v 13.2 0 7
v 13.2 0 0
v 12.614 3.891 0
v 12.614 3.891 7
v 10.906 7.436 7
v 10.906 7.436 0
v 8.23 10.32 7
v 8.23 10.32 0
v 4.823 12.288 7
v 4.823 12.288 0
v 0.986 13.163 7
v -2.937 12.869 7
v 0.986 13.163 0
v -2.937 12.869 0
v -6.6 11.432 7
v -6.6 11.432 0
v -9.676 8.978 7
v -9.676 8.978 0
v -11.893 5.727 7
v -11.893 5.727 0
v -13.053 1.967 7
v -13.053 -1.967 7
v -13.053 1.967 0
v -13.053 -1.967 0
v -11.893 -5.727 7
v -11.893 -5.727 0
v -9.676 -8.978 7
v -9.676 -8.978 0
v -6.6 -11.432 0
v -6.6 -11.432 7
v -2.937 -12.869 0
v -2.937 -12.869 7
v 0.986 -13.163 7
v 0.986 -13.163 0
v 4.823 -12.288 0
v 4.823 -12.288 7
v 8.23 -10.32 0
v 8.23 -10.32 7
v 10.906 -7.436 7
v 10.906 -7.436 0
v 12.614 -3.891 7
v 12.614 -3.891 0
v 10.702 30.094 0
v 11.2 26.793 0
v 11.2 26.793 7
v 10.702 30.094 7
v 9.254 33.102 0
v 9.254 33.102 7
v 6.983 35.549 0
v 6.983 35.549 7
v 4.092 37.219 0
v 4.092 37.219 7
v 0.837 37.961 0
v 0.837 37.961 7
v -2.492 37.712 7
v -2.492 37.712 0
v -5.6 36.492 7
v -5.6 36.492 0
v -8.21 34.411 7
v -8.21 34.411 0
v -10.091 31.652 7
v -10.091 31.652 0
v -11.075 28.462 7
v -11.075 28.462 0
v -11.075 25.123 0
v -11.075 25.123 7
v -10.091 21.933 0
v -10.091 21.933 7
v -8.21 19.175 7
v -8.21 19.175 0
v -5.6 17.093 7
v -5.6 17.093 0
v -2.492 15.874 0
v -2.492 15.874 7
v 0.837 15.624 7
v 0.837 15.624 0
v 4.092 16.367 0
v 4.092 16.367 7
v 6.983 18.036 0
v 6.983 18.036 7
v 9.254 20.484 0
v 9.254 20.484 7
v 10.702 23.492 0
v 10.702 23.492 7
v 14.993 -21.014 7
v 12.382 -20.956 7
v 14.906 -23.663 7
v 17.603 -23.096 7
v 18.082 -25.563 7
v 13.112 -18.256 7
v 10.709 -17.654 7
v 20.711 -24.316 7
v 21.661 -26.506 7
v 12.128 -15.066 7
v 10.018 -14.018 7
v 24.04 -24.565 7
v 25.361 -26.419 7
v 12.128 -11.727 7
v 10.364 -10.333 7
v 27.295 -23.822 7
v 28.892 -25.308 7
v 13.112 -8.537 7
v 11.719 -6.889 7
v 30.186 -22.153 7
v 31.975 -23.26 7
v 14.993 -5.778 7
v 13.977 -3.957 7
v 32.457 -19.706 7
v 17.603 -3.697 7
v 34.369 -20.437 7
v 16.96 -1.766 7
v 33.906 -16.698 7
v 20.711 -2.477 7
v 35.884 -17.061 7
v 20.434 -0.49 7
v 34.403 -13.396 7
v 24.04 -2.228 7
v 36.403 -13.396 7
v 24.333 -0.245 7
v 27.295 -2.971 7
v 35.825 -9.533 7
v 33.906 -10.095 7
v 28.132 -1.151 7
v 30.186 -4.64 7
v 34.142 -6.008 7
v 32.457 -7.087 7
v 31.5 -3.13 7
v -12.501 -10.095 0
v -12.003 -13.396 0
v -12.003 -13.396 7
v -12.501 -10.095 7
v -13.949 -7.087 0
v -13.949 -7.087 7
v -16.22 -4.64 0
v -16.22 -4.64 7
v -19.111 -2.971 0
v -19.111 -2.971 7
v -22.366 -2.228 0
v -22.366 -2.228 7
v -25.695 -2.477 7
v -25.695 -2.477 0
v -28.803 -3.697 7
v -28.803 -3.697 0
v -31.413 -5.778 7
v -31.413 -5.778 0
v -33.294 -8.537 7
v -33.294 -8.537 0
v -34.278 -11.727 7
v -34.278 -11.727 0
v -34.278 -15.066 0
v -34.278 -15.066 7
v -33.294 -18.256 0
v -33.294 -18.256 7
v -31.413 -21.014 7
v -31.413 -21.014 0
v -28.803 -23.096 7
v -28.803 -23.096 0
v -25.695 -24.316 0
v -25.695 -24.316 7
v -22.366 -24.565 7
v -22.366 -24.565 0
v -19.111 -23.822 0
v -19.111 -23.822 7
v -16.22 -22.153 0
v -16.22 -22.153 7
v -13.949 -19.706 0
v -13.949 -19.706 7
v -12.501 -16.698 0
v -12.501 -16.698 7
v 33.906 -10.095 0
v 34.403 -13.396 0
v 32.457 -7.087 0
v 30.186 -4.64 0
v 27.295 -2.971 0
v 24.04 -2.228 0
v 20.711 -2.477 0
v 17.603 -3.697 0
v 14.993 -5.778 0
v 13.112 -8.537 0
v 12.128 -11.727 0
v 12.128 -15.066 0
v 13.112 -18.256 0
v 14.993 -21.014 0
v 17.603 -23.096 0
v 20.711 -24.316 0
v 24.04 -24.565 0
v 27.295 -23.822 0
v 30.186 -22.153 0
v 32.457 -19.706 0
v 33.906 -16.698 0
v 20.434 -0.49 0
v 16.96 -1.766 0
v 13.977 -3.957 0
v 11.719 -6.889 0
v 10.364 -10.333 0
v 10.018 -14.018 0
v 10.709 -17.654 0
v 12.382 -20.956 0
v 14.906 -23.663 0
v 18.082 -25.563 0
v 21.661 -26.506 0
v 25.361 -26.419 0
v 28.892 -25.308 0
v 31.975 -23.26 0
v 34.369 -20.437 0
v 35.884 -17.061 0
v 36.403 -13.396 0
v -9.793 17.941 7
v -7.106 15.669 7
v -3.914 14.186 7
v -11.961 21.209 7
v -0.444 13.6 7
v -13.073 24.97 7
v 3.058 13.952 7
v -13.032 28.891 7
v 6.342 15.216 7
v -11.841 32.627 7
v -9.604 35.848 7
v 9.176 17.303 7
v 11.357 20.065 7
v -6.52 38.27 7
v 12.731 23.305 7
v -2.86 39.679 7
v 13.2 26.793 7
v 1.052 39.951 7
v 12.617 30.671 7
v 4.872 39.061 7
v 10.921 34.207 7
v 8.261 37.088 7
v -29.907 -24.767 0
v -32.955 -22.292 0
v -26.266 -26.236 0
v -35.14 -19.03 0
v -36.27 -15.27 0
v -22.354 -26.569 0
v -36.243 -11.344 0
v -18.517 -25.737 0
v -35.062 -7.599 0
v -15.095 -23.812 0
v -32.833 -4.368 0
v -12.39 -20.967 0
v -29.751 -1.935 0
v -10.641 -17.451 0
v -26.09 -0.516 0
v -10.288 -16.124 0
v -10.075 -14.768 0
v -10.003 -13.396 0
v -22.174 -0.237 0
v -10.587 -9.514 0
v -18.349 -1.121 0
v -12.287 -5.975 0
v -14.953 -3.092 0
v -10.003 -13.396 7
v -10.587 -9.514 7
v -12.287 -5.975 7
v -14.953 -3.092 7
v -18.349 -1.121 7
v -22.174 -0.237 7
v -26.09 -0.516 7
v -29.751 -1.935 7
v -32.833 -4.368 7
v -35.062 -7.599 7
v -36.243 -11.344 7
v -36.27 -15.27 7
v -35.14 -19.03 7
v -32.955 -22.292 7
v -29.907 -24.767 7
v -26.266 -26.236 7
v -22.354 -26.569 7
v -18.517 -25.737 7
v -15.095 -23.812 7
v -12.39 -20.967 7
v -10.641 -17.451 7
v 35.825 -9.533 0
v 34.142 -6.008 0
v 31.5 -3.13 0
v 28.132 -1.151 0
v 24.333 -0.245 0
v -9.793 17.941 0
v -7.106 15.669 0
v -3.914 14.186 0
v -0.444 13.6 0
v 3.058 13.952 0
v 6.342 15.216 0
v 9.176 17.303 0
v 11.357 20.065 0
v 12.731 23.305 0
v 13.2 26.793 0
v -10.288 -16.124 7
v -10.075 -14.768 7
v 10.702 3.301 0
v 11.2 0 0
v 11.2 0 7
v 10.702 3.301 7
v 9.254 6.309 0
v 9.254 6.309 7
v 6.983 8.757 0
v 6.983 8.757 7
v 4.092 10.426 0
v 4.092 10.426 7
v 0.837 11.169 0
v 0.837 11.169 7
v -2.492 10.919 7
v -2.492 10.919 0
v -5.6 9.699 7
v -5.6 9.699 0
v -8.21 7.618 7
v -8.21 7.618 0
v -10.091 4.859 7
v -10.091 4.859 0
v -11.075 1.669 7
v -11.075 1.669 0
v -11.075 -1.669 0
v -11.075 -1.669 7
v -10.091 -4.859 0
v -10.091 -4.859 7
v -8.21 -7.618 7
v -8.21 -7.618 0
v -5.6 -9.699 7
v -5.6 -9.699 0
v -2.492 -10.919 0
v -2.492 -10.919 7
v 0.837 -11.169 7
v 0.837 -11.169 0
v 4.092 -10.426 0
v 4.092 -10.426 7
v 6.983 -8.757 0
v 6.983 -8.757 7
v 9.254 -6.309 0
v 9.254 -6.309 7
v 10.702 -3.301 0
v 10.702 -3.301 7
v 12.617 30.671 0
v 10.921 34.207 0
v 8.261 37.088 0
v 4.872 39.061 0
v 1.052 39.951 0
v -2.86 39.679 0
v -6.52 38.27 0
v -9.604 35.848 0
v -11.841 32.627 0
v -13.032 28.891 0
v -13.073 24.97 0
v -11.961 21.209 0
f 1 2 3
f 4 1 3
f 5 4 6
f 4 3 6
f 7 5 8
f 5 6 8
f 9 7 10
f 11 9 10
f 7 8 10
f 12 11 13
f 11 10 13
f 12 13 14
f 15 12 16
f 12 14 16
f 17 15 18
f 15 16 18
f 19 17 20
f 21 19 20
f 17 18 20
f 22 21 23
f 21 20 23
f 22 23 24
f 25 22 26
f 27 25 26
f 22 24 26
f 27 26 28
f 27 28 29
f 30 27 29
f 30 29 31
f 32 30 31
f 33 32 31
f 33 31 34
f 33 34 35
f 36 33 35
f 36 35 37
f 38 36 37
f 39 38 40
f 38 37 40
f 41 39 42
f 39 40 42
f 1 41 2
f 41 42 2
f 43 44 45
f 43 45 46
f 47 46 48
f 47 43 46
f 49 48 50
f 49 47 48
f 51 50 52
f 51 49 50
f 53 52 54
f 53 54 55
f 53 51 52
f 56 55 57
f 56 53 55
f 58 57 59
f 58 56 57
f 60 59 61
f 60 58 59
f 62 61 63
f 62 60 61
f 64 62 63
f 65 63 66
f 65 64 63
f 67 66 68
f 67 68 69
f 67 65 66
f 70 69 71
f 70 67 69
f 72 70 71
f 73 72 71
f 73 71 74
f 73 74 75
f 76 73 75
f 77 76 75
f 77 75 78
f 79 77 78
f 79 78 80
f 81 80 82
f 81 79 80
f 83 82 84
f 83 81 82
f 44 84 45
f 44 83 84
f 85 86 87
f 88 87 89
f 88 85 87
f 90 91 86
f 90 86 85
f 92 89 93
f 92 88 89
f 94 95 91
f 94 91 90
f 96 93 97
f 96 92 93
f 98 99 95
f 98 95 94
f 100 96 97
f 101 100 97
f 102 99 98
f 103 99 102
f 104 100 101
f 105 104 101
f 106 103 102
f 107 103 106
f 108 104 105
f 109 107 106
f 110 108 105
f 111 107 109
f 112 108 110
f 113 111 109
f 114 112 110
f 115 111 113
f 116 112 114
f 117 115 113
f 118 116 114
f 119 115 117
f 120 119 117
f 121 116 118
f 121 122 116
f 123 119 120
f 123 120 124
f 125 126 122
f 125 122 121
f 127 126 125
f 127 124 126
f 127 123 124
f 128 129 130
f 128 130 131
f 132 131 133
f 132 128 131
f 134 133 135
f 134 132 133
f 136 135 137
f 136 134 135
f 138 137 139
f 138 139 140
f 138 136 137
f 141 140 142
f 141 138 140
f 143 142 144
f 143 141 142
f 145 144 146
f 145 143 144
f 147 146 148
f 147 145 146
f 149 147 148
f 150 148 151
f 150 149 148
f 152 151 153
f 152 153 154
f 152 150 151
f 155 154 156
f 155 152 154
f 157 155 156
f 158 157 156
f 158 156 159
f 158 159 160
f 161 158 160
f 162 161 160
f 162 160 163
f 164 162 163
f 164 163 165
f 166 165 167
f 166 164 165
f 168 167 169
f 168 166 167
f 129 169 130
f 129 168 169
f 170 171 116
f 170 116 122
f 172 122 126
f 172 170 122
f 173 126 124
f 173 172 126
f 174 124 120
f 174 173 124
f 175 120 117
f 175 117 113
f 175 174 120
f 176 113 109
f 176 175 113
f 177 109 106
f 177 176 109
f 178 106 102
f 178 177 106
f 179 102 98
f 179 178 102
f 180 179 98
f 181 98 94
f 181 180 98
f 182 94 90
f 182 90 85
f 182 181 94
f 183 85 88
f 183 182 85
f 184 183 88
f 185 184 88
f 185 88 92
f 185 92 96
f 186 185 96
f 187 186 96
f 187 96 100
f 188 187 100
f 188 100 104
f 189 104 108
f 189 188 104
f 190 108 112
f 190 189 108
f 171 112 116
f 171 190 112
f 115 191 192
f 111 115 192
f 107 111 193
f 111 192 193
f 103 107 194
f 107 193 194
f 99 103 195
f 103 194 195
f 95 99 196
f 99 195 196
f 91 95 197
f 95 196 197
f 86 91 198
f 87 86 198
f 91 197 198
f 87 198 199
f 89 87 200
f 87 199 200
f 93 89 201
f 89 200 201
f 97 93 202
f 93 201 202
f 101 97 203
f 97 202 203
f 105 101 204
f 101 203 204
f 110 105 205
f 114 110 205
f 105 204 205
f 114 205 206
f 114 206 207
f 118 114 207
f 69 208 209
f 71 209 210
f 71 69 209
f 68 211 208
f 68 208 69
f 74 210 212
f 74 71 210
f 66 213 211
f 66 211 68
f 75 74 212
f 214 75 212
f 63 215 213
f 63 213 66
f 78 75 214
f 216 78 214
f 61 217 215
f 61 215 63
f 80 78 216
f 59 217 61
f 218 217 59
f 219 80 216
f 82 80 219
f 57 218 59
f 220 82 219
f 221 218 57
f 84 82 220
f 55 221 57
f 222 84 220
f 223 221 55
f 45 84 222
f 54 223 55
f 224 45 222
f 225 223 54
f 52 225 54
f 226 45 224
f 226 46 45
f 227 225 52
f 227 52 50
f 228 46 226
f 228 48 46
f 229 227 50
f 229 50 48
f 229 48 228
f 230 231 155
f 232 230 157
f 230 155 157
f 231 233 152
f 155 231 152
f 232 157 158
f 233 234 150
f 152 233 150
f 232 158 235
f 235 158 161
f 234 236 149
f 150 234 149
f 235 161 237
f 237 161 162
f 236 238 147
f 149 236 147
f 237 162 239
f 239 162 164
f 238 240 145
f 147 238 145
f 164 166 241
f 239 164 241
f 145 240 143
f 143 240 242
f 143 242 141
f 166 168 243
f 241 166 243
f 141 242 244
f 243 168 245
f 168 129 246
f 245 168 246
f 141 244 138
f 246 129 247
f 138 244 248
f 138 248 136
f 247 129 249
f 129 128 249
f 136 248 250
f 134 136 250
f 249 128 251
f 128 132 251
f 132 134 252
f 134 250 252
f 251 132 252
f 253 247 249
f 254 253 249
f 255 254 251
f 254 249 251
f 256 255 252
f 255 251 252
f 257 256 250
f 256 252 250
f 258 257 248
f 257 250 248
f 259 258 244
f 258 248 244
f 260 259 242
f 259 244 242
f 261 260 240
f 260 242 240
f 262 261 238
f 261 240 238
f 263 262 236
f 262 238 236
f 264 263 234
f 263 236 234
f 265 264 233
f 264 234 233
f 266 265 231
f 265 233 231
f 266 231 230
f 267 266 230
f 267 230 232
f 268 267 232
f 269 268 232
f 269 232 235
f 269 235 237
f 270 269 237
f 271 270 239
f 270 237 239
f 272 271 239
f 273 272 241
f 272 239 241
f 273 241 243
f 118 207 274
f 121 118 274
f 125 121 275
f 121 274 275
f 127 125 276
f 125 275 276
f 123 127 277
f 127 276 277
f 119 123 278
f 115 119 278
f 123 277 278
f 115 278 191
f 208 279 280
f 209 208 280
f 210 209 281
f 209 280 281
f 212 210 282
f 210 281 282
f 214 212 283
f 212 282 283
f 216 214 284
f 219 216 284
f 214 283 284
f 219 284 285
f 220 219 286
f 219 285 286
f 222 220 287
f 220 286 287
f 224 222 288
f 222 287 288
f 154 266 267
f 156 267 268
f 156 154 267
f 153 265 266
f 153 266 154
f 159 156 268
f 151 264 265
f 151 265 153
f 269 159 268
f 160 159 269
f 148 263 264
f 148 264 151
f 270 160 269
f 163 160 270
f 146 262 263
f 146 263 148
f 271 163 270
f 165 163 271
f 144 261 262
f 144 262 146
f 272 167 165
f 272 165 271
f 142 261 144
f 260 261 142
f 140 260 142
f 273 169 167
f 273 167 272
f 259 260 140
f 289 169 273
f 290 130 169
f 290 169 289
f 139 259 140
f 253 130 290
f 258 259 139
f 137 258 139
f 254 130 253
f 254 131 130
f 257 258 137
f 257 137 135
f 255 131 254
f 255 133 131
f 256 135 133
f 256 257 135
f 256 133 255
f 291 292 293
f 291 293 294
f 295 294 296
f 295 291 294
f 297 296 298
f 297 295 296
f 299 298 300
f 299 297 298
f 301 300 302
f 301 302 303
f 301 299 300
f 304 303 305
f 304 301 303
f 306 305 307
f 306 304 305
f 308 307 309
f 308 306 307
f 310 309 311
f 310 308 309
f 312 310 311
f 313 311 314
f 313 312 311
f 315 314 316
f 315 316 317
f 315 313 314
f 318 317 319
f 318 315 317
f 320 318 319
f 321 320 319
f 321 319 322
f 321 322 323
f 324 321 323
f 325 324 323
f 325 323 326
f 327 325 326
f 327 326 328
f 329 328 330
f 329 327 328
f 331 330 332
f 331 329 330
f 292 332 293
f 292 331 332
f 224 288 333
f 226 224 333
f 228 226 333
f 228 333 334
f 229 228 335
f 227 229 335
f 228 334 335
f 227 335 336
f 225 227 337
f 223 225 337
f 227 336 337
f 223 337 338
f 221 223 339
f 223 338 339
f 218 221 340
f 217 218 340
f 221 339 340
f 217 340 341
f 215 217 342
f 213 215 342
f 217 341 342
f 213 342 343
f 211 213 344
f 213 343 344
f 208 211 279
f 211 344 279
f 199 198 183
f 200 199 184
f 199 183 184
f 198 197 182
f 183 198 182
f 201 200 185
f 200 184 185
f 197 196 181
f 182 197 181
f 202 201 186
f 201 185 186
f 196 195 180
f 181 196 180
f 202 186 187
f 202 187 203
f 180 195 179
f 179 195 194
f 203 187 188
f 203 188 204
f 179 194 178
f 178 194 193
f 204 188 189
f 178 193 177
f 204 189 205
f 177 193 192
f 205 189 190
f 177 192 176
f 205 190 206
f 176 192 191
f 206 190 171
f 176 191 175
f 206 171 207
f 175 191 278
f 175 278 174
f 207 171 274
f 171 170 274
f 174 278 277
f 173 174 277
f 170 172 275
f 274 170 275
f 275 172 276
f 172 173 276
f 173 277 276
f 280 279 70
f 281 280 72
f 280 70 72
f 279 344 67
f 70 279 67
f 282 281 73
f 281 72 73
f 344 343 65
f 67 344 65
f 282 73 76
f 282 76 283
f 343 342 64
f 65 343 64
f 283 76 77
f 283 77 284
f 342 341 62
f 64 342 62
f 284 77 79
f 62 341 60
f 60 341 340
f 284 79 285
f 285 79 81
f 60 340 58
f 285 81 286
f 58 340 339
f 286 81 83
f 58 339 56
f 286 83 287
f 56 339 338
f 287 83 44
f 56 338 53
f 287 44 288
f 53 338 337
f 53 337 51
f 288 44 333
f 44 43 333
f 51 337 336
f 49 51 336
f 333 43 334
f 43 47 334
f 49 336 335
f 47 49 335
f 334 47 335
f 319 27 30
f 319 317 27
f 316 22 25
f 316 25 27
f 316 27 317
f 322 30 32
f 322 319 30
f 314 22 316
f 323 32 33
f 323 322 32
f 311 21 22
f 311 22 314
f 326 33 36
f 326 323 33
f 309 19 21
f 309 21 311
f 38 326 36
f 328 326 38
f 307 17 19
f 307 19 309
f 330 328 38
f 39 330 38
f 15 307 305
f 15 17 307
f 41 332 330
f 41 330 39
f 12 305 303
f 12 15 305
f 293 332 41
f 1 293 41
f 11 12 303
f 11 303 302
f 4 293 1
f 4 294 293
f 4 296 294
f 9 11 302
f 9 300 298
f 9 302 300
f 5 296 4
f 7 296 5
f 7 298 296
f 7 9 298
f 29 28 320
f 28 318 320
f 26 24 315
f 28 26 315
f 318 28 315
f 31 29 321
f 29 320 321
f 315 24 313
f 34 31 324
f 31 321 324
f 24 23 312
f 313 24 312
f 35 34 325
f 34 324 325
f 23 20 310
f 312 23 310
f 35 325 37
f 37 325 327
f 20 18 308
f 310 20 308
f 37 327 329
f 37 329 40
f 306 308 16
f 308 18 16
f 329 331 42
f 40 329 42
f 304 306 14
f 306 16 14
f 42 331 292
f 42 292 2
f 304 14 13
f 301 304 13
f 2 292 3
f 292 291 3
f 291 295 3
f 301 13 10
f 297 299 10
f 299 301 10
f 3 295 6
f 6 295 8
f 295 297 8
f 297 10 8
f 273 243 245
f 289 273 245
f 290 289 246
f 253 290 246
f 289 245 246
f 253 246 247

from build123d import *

# Parameters (mm, degrees)
F0_R     = 13.2
F0_R_2   = 11.2
F1_DEPTH = 7


# Not quite as in the source:
# - the program builds the solid bodies; features that only make, move or delete a surface that nothing else refers to are left out


with BuildPart() as f1:
    # F0 (on Top) → F1 (new body)
    with BuildSketch(Plane.XY):
        Circle(F0_R)
        Circle(F0_R_2, mode=Mode.SUBTRACT)
    extrude(amount=F1_DEPTH)


with BuildPart() as f1b:
    # F0 (on Top) → F1, piece 2 (new body)
    with BuildSketch(Plane.XY):
        with BuildLine():
            ThreePointArc((-9.7925592787, 17.9414493505), (4.7422683139, 14.4740434947), (13.2, 26.7927646637))
            ThreePointArc((13.2, 26.7927646637), (-4.7422683139, 39.1114858327), (-9.7925592787, 17.9414493505))
        make_face()
        with Locations((0, 26.7927646637)):
            Circle(F0_R_2, mode=Mode.SUBTRACT)
    extrude(amount=F1_DEPTH)


with BuildPart() as f1c:
    # F0 (on Top) → F1, piece 3 (new body)
    with BuildSketch(Plane.XY):
        with BuildLine():
            ThreePointArc((-10.6414712789, -17.4513297787), (-10.163755205, -15.448818085), (-10.0032148364, -13.3963823318))
            ThreePointArc((-10.0032148364, -13.3963823318), (-36.2426744678, -11.3439465787), (-10.6414712789, -17.4513297787))
        make_face()
        with Locations((-23.2032148364, -13.3963823318)):
            Circle(F0_R_2, mode=Mode.SUBTRACT)
    extrude(amount=F1_DEPTH)


with BuildPart() as f1d:
    # F0 (on Top) → F1, piece 4 (new body)
    with BuildSketch(Plane.XY):
        with BuildLine():
            ThreePointArc((20.4340305576, -0.4901195718), (14.9060235188, -23.6626677477), (36.4032148364, -13.3963823318))
            ThreePointArc((36.4032148364, -13.3963823318), (31.5004061539, -3.130096916), (20.4340305576, -0.4901195718))
        make_face()
        with Locations((23.2032148364, -13.3963823318)):
            Circle(F0_R_2, mode=Mode.SUBTRACT)
    extrude(amount=F1_DEPTH)


solid = Compound([f1.part, f1b.part, f1c.part, f1d.part])
